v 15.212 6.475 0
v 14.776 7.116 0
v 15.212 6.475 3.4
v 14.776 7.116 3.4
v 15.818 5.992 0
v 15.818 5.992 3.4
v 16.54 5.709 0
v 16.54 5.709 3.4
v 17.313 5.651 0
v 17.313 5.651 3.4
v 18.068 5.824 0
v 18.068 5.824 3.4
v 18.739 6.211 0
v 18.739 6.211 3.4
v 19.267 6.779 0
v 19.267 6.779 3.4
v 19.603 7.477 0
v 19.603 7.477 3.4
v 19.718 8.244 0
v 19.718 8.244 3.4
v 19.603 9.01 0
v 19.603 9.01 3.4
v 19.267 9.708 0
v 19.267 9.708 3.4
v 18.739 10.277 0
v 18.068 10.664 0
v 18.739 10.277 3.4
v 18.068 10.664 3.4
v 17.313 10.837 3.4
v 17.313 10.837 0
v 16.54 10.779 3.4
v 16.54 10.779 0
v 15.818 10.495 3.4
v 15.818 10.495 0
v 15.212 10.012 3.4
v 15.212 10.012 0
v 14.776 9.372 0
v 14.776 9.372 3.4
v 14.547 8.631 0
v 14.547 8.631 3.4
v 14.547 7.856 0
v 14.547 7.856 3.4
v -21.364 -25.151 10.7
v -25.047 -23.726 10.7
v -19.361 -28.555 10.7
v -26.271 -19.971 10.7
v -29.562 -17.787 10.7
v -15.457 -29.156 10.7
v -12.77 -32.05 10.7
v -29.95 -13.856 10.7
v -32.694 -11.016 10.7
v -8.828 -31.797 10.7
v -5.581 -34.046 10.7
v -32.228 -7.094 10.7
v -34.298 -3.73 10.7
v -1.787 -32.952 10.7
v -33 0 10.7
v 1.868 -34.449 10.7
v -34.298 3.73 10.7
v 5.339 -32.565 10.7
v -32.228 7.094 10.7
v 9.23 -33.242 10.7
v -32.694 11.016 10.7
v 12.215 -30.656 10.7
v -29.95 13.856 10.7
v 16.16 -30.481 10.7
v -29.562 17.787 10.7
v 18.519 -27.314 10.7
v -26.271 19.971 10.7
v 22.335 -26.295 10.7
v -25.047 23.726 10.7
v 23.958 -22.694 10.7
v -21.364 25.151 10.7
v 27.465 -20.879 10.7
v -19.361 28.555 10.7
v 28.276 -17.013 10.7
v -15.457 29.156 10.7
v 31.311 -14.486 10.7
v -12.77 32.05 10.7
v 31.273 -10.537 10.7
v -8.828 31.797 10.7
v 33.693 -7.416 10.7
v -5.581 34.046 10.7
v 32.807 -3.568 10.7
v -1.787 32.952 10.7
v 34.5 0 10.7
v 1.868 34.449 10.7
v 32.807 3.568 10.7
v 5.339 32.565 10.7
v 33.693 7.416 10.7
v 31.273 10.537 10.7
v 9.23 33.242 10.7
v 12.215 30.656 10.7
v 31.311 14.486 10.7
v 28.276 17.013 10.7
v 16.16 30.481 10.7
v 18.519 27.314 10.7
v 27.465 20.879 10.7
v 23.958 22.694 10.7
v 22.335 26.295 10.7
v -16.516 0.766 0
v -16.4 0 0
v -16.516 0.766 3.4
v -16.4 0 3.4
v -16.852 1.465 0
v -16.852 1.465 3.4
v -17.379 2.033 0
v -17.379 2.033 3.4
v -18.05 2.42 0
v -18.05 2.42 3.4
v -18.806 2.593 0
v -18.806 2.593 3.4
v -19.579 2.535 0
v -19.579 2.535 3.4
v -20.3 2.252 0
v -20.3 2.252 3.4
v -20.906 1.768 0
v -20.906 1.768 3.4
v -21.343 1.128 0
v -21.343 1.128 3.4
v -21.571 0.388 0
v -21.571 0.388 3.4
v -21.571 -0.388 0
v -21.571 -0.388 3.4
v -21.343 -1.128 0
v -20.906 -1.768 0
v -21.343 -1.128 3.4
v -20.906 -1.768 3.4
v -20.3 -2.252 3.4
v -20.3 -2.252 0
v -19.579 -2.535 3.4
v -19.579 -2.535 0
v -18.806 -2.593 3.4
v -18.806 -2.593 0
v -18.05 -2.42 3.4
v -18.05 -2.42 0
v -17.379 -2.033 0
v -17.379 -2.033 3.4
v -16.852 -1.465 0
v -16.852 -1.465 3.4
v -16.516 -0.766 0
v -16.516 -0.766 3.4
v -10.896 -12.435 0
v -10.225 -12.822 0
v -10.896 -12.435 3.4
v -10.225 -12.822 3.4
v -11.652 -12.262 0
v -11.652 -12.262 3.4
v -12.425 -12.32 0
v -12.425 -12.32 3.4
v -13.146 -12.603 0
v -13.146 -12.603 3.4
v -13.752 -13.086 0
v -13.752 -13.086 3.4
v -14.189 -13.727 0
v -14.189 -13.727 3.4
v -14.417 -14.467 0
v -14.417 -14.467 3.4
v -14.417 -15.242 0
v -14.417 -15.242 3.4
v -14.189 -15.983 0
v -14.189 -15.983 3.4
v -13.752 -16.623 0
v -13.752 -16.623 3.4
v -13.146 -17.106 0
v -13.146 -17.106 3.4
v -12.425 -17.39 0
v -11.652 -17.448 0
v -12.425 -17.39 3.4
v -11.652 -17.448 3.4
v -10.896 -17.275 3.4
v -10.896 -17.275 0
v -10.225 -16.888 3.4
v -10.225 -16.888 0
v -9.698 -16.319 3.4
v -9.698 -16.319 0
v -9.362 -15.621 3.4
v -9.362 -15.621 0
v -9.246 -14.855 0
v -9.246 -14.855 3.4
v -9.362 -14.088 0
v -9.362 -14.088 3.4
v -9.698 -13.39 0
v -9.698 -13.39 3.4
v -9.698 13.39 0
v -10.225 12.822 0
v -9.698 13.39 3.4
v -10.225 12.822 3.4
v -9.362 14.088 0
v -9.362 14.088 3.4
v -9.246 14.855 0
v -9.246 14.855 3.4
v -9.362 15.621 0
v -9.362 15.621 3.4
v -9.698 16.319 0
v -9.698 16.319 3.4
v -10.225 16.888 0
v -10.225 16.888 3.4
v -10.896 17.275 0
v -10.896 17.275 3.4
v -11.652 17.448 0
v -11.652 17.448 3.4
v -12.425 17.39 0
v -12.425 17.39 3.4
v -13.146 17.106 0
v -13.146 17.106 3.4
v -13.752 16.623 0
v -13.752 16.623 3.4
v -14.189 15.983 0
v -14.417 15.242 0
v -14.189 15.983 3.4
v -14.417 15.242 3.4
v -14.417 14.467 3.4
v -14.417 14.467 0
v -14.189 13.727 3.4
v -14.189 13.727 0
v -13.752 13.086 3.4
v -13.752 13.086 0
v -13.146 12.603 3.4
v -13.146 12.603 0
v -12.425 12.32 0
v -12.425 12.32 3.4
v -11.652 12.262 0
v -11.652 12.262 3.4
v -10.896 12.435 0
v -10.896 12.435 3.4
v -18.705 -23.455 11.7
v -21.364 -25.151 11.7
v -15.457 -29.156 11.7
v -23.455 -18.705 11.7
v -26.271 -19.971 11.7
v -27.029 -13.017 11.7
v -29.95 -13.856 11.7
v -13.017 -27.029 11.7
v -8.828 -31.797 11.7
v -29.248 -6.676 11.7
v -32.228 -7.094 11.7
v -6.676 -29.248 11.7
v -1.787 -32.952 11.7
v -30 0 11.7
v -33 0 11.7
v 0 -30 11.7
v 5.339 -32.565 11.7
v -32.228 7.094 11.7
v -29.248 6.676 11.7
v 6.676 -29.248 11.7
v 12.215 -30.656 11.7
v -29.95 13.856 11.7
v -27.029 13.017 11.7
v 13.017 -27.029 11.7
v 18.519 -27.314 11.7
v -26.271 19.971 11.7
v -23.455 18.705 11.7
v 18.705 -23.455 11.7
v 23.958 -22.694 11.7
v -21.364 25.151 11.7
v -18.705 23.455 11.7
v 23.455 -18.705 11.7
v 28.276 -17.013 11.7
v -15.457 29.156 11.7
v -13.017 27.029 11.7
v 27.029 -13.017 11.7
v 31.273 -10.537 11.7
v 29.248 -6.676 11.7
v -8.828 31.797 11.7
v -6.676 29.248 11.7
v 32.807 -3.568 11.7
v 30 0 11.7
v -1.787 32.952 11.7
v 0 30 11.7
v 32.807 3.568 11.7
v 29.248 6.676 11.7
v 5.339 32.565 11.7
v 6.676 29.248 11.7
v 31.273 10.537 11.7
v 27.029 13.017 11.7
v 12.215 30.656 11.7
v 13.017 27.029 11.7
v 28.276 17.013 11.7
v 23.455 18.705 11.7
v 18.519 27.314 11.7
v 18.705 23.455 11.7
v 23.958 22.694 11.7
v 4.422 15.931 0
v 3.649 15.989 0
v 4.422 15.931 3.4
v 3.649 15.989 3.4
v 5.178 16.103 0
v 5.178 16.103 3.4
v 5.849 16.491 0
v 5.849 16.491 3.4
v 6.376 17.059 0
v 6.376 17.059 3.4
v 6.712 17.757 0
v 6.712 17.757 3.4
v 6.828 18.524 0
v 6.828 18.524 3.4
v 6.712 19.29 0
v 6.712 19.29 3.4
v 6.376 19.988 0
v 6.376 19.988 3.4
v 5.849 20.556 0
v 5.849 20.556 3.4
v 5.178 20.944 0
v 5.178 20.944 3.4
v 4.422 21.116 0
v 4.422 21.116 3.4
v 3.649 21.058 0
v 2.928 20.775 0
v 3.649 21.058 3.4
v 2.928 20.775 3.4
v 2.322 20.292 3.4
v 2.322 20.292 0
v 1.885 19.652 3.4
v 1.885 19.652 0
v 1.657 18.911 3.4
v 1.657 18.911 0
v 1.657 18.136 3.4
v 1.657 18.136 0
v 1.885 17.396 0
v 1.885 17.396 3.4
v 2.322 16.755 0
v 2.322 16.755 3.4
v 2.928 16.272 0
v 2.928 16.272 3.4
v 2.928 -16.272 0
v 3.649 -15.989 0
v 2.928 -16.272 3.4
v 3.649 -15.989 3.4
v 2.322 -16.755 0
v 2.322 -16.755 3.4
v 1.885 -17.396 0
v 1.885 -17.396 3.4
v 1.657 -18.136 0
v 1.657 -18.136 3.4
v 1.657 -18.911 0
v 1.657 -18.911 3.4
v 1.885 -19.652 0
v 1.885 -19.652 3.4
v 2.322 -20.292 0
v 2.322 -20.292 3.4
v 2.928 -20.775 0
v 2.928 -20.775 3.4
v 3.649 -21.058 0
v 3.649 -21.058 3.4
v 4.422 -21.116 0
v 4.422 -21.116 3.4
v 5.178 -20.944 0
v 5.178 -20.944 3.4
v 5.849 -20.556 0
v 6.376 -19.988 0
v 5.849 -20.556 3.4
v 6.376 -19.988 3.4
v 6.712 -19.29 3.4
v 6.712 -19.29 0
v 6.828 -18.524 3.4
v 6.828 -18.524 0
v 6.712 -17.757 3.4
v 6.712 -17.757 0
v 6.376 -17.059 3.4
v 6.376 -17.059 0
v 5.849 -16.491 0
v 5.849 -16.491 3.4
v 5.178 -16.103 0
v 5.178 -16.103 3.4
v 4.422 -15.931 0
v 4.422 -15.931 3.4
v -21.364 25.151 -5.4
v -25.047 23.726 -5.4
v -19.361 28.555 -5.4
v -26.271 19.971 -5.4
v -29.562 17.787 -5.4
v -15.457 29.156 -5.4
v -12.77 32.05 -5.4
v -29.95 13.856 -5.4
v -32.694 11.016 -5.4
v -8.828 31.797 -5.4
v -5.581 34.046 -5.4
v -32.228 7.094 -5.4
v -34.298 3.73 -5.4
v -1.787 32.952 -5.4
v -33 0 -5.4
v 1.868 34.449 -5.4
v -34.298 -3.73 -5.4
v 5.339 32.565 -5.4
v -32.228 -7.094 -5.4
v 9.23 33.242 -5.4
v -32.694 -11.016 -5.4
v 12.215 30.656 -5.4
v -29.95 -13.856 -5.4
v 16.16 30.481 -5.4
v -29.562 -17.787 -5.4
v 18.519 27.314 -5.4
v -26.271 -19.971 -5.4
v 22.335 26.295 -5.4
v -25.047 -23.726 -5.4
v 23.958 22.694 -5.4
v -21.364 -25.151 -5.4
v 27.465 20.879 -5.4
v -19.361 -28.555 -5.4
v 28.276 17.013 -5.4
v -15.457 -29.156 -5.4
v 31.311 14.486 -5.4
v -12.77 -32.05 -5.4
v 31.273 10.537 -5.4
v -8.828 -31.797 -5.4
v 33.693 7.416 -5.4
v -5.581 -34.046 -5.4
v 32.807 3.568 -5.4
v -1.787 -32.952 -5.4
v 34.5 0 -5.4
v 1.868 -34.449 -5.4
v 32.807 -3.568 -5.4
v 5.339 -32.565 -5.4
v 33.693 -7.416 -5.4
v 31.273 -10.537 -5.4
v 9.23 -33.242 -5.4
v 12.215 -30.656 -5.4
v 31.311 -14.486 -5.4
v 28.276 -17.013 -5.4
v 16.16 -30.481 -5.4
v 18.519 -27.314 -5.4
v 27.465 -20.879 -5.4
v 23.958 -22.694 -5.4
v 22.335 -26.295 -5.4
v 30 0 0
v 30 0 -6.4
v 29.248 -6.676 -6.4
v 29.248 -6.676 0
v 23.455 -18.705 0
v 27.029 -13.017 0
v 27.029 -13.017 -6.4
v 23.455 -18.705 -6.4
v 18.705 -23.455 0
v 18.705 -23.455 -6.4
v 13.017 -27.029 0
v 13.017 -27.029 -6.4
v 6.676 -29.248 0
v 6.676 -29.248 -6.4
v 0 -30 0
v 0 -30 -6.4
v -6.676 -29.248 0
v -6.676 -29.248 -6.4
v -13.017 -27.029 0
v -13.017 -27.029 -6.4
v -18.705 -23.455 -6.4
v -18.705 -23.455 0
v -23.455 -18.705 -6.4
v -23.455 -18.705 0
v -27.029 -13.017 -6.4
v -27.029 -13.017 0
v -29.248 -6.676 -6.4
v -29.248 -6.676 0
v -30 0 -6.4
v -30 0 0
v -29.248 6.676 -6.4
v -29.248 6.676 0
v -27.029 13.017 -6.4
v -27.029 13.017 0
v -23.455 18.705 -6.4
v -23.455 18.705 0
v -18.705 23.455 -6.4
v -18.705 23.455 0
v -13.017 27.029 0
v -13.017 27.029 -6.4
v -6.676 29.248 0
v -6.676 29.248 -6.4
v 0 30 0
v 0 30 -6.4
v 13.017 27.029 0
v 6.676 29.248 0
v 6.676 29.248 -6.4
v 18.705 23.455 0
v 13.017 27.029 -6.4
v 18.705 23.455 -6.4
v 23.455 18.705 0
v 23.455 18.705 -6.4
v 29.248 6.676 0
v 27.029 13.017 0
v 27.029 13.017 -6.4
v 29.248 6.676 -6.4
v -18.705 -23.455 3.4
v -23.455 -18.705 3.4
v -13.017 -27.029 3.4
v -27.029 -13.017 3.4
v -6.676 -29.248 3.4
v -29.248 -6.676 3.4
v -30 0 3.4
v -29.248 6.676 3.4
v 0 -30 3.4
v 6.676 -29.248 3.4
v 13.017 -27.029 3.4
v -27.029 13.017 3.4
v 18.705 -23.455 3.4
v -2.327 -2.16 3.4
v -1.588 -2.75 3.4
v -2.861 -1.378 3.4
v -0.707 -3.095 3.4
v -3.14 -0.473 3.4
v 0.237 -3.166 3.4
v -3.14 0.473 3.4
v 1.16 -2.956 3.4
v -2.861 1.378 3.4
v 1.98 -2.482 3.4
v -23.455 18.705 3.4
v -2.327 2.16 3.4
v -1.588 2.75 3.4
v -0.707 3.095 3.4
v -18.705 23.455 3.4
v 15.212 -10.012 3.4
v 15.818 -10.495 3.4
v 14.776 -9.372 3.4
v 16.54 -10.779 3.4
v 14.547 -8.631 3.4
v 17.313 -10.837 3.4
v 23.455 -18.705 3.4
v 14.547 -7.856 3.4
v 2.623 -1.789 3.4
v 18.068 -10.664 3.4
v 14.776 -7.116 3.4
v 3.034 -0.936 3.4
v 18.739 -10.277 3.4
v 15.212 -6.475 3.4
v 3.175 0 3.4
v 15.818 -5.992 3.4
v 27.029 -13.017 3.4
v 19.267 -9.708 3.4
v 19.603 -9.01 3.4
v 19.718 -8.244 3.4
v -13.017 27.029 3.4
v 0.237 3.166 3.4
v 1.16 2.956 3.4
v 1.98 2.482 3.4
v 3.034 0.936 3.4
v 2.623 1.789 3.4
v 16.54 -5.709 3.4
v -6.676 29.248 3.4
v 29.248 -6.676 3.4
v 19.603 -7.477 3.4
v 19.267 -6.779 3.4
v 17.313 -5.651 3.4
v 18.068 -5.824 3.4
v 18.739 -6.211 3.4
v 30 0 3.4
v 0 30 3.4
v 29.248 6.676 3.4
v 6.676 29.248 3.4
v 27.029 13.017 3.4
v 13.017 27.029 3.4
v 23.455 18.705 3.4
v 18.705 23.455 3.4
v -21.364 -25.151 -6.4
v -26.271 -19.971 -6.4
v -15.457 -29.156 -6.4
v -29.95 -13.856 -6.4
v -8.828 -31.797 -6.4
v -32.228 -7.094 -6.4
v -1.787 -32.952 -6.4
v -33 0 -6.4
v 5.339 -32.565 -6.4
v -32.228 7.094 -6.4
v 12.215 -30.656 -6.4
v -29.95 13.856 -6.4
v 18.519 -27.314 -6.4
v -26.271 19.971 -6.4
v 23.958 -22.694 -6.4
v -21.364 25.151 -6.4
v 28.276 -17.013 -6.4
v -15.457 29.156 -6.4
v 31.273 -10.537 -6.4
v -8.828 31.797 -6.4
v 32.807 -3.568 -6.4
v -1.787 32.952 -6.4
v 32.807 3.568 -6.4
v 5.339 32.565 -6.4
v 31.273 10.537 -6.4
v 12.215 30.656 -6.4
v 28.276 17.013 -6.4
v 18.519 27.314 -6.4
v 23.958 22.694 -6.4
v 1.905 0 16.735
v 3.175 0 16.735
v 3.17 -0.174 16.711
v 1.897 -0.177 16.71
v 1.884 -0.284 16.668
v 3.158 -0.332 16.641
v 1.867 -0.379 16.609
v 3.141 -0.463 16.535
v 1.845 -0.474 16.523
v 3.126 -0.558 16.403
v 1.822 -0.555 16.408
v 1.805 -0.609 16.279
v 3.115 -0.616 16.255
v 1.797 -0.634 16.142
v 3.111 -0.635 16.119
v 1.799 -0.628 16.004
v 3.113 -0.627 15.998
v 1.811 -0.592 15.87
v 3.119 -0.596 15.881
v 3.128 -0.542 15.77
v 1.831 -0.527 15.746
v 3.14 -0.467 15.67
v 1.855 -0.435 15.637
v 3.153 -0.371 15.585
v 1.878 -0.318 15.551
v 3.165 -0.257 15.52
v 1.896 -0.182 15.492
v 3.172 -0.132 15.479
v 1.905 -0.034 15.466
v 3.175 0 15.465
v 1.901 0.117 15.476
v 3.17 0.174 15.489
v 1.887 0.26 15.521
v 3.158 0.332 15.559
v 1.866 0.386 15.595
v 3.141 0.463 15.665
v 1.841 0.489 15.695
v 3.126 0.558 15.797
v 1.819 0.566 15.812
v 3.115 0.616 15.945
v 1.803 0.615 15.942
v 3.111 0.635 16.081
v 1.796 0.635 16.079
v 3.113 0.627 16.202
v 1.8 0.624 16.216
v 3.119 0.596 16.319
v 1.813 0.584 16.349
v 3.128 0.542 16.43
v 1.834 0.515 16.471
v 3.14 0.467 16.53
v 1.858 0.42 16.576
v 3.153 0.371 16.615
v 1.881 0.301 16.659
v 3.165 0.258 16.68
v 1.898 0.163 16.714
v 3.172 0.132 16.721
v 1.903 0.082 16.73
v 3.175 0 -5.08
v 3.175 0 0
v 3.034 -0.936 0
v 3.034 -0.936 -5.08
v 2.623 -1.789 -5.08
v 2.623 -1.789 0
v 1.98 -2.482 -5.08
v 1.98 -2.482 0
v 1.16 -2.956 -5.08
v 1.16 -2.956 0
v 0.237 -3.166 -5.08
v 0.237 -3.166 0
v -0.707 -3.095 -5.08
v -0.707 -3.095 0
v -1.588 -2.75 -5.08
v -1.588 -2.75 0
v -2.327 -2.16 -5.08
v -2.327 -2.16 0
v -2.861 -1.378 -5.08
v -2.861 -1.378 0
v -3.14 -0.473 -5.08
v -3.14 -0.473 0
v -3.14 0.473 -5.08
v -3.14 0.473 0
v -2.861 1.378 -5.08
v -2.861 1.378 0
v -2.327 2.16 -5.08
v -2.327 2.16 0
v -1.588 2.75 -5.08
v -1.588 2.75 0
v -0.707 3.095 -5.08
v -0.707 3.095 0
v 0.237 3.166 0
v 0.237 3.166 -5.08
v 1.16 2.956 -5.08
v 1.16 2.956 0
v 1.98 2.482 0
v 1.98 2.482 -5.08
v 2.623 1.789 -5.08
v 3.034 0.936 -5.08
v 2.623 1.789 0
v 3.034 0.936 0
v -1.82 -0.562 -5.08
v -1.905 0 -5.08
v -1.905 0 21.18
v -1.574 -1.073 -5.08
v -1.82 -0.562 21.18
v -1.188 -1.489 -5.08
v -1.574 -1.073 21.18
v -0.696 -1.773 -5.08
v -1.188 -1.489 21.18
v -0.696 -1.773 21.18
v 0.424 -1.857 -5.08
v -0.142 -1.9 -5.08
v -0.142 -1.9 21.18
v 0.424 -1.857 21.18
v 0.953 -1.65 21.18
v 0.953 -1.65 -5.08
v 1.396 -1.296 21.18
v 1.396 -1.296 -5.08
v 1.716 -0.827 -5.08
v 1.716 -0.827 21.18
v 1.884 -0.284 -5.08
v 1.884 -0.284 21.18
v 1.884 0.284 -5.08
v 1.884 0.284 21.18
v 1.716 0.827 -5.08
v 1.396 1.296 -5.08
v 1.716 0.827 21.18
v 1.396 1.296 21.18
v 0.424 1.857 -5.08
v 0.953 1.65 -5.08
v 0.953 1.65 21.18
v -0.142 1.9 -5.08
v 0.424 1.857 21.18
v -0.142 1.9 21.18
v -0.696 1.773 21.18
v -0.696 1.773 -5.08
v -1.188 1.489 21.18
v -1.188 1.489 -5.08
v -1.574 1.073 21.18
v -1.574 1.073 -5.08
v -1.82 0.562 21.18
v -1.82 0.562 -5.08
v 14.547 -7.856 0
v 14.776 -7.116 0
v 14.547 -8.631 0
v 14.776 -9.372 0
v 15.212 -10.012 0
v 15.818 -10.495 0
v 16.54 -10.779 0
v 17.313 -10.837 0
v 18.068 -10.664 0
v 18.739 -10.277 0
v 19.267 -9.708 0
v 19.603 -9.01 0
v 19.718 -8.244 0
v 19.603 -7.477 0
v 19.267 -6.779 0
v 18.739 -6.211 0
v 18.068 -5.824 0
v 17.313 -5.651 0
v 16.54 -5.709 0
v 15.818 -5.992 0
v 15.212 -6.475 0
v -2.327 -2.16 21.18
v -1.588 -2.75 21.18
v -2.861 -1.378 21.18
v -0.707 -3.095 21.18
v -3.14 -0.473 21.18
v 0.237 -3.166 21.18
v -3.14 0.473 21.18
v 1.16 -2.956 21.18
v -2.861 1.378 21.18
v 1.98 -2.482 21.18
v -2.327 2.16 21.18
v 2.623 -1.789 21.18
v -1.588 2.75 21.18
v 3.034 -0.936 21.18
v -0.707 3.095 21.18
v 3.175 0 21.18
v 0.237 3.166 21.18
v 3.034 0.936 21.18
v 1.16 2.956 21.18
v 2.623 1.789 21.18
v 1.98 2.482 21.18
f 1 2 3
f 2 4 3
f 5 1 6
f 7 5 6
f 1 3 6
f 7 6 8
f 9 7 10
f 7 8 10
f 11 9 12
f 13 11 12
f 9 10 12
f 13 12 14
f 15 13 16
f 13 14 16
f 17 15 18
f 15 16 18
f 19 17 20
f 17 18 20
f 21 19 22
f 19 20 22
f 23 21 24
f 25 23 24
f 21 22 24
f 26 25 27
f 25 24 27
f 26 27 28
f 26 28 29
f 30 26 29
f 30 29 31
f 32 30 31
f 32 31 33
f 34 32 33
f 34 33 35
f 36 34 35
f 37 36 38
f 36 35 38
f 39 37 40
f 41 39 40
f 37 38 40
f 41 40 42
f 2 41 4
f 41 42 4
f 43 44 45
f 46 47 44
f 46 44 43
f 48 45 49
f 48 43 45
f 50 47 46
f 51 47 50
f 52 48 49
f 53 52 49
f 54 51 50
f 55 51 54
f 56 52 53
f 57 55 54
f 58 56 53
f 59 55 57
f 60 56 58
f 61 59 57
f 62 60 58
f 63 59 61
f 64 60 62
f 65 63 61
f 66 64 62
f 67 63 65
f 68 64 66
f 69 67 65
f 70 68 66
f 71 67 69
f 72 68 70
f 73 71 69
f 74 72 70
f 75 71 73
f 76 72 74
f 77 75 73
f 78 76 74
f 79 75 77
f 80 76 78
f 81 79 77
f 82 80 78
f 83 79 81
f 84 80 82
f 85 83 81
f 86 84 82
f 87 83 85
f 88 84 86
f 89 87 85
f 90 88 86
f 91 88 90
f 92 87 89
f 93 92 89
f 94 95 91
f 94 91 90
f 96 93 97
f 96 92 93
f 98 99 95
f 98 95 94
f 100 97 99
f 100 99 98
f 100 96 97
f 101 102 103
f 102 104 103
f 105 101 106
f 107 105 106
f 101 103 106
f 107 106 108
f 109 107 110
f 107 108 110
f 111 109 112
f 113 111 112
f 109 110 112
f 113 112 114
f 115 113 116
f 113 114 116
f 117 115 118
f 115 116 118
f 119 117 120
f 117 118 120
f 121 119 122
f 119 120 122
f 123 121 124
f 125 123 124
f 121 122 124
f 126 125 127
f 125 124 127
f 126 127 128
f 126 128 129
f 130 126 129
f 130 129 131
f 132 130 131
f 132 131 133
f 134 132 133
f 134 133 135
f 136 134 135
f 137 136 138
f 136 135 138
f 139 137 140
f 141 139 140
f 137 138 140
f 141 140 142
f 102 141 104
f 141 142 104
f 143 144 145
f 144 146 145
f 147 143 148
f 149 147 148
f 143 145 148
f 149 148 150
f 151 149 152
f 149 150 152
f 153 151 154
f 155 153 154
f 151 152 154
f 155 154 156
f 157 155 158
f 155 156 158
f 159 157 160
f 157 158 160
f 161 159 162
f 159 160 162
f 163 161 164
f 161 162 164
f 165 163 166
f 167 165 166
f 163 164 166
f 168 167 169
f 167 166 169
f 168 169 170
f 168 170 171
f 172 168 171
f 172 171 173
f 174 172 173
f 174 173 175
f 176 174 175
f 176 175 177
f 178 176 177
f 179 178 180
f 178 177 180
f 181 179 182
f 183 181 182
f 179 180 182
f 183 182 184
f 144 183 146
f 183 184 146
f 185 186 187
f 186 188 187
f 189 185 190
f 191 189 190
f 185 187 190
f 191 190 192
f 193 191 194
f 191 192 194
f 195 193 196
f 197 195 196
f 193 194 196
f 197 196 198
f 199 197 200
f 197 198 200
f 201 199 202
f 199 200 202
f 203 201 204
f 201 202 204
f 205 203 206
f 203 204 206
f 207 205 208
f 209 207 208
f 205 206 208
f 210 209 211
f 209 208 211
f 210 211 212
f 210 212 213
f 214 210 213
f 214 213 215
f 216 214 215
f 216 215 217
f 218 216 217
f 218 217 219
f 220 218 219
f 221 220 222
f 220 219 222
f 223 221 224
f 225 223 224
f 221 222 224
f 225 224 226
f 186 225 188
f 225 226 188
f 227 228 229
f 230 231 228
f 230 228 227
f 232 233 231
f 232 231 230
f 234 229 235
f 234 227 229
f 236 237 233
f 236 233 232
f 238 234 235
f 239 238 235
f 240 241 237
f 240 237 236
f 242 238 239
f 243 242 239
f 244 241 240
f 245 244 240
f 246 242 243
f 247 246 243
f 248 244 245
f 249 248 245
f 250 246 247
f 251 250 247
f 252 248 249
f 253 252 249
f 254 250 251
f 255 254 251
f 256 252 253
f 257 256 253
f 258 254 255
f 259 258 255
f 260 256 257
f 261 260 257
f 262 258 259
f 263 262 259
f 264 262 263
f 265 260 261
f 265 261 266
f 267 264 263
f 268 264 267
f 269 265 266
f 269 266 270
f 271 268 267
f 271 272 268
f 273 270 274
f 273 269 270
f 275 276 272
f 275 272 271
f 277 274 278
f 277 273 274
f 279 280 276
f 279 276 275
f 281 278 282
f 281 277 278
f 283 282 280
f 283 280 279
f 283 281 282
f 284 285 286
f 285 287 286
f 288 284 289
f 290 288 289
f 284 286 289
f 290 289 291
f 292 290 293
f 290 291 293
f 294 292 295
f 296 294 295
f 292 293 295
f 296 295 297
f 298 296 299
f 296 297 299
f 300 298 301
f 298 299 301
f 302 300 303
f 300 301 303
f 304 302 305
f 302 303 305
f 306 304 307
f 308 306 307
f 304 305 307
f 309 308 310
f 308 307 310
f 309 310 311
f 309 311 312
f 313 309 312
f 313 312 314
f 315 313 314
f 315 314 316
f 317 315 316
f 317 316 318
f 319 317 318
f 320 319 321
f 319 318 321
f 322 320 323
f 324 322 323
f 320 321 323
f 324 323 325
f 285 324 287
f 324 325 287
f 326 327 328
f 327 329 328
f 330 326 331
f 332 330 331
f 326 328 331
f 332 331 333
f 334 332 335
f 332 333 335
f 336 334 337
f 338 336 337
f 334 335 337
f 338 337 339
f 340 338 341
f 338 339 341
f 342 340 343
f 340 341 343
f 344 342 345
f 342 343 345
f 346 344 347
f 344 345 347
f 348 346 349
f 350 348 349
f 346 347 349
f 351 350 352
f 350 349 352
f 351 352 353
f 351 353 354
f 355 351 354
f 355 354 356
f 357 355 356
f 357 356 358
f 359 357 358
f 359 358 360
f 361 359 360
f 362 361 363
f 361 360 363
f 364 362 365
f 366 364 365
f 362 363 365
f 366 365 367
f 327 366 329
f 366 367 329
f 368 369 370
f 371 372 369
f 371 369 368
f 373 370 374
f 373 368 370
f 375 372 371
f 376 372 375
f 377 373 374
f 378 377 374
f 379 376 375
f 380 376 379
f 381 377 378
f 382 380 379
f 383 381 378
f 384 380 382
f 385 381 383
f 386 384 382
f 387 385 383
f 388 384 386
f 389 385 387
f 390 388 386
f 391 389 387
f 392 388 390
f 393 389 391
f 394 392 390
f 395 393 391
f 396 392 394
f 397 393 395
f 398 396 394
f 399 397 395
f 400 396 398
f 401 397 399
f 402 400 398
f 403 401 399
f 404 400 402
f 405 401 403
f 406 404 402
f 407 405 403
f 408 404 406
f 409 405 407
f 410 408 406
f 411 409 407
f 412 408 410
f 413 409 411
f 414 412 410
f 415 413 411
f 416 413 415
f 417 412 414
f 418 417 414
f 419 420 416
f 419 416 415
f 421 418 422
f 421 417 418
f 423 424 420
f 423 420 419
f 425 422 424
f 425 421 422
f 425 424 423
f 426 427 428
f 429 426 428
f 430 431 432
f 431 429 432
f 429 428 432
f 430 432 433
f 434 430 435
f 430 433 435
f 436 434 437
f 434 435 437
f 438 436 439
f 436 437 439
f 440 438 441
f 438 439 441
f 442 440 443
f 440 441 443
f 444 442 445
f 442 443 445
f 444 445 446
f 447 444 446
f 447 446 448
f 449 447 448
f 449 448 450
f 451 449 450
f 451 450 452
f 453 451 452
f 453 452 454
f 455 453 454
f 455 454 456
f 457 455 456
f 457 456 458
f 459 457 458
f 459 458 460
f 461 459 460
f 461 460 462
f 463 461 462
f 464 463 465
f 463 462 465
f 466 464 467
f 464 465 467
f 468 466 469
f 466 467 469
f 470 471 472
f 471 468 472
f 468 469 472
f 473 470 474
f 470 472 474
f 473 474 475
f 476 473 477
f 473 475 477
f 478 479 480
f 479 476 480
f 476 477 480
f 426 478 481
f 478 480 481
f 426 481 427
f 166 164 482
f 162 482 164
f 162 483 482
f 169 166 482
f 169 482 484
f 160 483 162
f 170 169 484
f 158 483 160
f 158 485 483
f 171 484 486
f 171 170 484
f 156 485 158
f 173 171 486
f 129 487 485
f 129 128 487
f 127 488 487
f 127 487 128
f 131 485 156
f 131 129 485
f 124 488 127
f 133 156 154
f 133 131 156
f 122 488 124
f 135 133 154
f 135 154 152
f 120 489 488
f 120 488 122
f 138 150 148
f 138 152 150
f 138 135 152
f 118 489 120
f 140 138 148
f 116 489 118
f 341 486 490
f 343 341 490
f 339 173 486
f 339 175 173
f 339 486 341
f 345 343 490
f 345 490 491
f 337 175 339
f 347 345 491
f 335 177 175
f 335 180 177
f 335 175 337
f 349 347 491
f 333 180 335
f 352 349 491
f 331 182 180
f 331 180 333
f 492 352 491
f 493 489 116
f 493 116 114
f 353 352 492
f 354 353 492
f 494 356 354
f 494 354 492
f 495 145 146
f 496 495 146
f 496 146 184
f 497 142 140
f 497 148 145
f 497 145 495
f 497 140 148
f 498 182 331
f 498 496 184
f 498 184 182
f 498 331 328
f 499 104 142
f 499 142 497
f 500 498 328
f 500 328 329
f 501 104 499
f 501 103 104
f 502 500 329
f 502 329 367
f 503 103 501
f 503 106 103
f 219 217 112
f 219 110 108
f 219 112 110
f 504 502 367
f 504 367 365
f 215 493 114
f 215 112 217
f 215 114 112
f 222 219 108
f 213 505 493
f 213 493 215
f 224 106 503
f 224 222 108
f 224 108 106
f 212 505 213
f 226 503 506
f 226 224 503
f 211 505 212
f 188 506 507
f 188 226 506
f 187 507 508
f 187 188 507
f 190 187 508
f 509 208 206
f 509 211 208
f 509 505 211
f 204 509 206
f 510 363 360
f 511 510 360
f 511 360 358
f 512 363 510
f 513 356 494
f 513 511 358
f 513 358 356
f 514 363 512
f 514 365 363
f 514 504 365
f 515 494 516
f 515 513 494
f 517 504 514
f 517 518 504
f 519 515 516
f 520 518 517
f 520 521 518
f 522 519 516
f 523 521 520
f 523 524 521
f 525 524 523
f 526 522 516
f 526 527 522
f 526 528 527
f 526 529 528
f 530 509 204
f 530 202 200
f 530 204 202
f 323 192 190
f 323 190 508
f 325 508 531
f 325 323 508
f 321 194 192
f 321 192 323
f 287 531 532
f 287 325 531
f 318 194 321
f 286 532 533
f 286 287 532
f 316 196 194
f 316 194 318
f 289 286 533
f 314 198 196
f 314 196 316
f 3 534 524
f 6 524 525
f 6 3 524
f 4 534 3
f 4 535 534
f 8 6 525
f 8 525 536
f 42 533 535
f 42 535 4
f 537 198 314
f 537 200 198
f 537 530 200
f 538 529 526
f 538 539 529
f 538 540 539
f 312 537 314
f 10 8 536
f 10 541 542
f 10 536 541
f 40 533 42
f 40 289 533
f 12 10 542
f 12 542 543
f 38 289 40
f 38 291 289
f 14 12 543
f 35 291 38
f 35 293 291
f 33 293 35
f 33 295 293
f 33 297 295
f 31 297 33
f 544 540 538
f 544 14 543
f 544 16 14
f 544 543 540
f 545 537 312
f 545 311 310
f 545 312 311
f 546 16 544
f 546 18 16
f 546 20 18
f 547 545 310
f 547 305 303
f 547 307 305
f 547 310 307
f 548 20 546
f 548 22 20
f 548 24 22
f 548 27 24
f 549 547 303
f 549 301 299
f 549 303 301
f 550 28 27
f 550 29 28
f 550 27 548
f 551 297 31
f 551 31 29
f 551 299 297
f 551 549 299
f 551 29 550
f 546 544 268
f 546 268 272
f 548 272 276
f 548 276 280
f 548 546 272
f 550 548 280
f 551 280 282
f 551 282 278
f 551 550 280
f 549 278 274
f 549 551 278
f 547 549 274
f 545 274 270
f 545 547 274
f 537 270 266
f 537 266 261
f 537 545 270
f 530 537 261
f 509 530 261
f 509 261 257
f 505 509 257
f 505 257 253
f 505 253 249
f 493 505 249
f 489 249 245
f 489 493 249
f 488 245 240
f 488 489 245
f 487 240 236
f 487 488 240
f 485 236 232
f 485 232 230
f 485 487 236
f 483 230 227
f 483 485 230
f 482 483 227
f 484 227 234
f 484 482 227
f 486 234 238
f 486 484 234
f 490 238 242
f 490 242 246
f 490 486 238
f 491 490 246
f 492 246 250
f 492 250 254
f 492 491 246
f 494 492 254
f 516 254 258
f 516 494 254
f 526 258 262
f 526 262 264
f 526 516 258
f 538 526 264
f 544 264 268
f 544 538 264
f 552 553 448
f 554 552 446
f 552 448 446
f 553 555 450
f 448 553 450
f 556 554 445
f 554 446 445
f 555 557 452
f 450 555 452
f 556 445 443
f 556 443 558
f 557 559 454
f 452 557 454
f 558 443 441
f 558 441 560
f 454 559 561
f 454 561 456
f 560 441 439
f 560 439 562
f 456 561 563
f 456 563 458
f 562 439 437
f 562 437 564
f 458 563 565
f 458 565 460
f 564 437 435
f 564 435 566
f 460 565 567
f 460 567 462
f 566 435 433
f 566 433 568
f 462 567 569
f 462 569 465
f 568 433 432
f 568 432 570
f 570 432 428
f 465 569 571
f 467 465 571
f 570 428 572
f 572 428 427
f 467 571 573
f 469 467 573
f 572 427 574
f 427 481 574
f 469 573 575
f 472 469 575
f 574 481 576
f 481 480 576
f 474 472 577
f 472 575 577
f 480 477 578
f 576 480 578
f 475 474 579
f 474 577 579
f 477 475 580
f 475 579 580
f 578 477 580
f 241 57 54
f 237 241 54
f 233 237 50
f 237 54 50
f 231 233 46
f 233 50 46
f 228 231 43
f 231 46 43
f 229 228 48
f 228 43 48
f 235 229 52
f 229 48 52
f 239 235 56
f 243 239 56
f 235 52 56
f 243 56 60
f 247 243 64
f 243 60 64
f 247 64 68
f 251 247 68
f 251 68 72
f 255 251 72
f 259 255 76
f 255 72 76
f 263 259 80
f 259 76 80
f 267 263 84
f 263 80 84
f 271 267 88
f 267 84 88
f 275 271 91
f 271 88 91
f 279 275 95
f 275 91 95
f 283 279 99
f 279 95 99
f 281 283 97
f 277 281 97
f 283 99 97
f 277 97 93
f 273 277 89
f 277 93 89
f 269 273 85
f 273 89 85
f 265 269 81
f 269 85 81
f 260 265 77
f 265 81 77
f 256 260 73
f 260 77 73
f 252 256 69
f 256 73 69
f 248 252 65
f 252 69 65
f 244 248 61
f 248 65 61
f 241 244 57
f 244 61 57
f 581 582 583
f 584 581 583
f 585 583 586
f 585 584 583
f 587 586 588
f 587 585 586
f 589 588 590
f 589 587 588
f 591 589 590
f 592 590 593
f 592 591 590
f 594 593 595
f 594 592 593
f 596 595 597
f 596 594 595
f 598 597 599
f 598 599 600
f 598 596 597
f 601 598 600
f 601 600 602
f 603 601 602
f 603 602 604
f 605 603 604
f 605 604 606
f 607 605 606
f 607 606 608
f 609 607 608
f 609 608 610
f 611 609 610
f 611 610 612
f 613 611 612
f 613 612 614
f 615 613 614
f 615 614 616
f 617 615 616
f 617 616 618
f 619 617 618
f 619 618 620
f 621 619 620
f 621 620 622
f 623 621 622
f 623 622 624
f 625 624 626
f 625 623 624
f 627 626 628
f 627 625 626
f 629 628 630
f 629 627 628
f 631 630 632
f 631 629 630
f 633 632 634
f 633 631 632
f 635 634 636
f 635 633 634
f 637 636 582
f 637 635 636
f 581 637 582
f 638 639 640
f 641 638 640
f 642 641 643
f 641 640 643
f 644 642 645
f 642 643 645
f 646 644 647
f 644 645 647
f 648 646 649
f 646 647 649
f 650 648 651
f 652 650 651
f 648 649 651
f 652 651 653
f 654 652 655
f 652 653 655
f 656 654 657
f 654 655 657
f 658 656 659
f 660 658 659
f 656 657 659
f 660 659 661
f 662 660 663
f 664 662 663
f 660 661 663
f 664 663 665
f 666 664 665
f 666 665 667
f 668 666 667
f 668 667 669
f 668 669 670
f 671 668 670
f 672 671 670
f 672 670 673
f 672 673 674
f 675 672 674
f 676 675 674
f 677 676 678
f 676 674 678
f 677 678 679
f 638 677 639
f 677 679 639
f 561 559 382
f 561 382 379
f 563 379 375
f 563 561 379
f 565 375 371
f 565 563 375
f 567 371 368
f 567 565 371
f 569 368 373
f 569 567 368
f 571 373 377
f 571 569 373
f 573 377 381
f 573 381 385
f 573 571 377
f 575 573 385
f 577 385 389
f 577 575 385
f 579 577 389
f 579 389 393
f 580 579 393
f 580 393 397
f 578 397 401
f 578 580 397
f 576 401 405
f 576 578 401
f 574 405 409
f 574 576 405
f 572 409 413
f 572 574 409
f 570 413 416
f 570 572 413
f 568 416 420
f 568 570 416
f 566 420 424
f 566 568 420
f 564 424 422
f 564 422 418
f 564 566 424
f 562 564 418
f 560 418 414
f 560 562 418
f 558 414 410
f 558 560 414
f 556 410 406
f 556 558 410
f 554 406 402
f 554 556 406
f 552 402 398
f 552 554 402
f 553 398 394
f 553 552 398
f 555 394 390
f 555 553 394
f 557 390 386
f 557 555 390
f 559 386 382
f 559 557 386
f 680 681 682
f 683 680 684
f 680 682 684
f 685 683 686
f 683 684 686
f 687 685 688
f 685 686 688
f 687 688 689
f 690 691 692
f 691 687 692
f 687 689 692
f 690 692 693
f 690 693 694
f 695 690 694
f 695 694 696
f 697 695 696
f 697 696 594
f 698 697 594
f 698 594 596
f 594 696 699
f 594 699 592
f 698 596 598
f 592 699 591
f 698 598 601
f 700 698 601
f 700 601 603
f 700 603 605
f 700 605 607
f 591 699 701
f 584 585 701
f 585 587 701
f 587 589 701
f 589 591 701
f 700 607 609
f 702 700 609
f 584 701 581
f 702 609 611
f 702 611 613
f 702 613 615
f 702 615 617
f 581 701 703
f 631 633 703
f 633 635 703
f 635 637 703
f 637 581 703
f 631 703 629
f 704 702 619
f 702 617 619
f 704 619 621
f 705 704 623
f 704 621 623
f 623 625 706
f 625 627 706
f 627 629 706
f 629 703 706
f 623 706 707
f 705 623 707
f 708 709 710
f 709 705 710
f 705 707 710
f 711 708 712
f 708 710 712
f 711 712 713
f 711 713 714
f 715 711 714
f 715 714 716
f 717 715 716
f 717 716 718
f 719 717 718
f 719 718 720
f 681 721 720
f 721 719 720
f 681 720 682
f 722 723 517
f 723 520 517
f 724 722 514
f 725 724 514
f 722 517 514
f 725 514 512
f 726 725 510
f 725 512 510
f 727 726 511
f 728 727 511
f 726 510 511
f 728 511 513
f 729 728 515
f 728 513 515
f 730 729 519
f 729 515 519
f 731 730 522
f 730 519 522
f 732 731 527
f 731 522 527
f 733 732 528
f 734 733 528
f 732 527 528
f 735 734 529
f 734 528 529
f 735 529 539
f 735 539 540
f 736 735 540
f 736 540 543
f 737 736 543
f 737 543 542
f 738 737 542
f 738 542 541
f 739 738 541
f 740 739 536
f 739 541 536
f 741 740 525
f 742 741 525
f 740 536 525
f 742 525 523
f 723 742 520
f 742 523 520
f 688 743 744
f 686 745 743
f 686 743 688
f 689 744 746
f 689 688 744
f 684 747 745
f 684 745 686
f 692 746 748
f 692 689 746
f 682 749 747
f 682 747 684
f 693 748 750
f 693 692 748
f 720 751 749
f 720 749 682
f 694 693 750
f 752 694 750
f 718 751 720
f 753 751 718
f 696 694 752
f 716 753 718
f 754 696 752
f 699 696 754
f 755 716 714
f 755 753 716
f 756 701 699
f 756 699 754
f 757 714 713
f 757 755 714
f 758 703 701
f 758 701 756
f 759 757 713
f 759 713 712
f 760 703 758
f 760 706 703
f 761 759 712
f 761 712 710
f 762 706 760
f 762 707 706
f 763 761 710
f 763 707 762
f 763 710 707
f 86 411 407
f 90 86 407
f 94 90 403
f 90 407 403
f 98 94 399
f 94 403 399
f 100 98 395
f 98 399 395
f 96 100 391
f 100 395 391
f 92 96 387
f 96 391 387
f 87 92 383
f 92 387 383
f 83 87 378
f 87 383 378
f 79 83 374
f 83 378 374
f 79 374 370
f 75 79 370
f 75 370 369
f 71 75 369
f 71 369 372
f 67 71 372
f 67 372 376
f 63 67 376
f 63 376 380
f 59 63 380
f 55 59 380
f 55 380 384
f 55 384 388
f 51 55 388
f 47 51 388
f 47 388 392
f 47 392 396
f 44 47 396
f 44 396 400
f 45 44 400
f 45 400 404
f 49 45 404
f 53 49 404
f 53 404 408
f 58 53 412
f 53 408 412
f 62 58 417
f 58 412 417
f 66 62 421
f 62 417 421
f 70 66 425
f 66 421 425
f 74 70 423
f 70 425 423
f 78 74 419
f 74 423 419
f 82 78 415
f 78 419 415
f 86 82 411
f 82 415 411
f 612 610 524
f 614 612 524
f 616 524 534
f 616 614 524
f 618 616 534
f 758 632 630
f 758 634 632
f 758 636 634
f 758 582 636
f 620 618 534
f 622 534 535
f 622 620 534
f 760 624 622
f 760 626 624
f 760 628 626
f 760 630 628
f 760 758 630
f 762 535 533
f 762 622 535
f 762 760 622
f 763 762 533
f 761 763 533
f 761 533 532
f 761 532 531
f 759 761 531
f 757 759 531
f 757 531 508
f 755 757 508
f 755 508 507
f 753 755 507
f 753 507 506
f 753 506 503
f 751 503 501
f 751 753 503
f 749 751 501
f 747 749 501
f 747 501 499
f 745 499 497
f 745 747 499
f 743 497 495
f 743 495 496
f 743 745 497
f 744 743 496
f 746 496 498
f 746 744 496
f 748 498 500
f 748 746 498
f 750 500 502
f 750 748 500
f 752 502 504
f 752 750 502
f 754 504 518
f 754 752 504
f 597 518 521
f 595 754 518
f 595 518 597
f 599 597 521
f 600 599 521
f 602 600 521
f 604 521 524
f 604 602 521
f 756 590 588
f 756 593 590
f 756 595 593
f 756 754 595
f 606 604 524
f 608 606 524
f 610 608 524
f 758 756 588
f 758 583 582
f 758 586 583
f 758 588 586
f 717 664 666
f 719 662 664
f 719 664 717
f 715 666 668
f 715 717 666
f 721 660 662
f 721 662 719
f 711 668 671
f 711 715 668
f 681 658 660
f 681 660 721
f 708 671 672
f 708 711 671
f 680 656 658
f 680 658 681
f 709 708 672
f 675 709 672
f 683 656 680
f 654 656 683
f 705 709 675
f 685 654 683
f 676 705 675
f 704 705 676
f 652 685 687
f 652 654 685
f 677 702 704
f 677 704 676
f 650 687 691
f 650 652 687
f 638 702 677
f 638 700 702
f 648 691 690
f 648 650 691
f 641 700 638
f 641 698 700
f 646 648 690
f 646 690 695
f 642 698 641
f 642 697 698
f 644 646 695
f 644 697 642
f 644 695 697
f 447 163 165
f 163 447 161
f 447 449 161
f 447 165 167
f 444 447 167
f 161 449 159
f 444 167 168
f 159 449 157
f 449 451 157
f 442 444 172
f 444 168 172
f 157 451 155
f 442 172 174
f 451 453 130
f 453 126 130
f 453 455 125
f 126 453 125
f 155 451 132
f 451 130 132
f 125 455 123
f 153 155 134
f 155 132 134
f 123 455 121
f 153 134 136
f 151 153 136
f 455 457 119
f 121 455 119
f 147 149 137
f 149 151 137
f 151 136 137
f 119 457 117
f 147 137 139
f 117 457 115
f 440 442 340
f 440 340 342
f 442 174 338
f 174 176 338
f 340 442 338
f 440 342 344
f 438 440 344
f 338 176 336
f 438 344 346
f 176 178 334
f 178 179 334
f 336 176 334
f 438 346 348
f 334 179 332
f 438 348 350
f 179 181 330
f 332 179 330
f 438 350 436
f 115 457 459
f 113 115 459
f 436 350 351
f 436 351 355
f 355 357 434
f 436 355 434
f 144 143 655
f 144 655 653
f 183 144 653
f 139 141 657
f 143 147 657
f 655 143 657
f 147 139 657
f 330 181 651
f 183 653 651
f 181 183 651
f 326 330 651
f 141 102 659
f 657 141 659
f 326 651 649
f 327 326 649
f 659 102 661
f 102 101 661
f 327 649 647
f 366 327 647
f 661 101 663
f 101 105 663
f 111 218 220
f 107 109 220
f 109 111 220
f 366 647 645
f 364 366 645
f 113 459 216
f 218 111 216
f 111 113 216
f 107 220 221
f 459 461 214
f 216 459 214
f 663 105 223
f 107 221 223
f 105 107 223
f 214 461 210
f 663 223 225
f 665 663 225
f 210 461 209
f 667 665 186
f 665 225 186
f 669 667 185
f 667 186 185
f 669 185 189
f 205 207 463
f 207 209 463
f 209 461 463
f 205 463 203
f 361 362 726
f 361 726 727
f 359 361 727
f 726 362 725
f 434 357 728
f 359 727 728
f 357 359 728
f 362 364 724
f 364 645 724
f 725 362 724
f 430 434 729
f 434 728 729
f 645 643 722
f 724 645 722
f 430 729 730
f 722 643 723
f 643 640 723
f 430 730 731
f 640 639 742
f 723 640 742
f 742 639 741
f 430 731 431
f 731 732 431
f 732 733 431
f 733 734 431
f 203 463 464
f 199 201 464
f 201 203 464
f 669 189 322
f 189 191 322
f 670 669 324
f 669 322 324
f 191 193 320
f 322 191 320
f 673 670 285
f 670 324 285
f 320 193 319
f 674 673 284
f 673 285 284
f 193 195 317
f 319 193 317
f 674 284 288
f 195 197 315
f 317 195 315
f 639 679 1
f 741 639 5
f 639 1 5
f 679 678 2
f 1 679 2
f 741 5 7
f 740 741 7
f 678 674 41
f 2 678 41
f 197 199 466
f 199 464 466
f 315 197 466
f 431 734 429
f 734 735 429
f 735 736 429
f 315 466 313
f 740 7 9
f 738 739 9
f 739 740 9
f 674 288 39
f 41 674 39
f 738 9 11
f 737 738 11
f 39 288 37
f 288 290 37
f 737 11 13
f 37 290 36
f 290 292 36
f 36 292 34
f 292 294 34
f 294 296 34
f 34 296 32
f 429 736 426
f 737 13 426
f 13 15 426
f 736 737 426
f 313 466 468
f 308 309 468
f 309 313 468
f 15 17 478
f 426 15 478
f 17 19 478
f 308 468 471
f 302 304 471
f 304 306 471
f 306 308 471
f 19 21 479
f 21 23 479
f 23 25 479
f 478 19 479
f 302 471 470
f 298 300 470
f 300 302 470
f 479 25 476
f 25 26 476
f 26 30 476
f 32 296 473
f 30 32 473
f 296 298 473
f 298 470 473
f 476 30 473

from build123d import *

# Parameters (mm, degrees)
SKETCH1_R               = 30
EXTRUDE1_DEPTH          = 3.4
SKETCH2_R               = 33.4
SKETCH2_R_2             = 30
EXTRUDE2_DEPTH          = 8.3
EXTRUDE3_START          = 9.8
SKETCH3_R               = 33.4
SKETCH3_R_2             = 30
EXTRUDE3_DEPTH          = 9.8
EXTRUDE4_START          = -18.1
SKETCH4_R               = 34.5
SKETCH4_R_2             = 33.4
EXTRUDE4_DEPTH          = 18.1
SKETCH6_R               = 34.5
SKETCH6_R_2             = 33
EXTRUDE5_DEPTH          = 1
EXTRUDE6_START          = -1
SKETCH8_R               = 34.5
SKETCH8_R_2             = 33
EXTRUDE6_DEPTH          = 1
SKETCH9_R               = 3.175
EXTRUDE7_DEPTH          = 5.08
EXTRUDE8_START          = 17.78
SKETCH10_R              = 3.175
SKETCH10_R_2            = 1.905
EXTRUDE8_DEPTH          = 17.78
SKETCH13_R              = 2.6
EXTRUDE11_DEPTH         = 10
CIRPATTERN1_COUNT       = 7
CUT_EXTRUDE1_REACH      = 55.189
CUT_EXTRUDE1_END_RADIUS = 3.175
SKETCH14_R              = 0.635
CUT_EXTRUDE2_REACH      = 57.408
SKETCH15_R              = 1.905


with BuildPart() as part:
    # Sketch1 → Extrude1 (new body)
    with BuildSketch(Plane.XY):
        Circle(SKETCH1_R)
    extrude(amount=EXTRUDE1_DEPTH)



with BuildPart() as body_2:
    # Sketch2 → Extrude2 (new body)
    with BuildSketch(Plane.XY.offset(3.4)):
        with Locations(Location((0, 0, 0), (0, 0, 180))):
            Circle(SKETCH2_R)
        Circle(SKETCH2_R_2, mode=Mode.SUBTRACT)
    extrude(amount=EXTRUDE2_DEPTH)


with BuildPart() as part_1:
    add(part.part)

    add(body_2.part)  # Extrude3 merges body 2
    # Sketch3 → Extrude3 (add)
    with BuildSketch(Plane(origin=(0, 0, 3.4), x_dir=(-1, 0, 0), z_dir=(0, 0, -1)).offset(EXTRUDE3_START)):
        with Locations(Location((0, 0, 0), (0, 0, 180))):
            Circle(SKETCH3_R)
        with Locations(Location((0, 0, 0), (0, 0, 180))):
            Circle(SKETCH3_R_2, mode=Mode.SUBTRACT)
    extrude(amount=-EXTRUDE3_DEPTH)

    # Sketch4 → Extrude4 (add)
    with BuildSketch(Plane.XY.offset(11.7).offset(EXTRUDE4_START)):
        Circle(SKETCH4_R)
        Circle(SKETCH4_R_2, mode=Mode.SUBTRACT)
    extrude(amount=EXTRUDE4_DEPTH)

    # Sketch6 → Extrude5 (cut)
    with BuildSketch(Plane(origin=(0, 0, -6.4), x_dir=(-1, 0, 0), z_dir=(0, 0, -1))):
        with Locations(Location((0, 0, 0), (0, 0, 180))):
            Circle(SKETCH6_R)
        Circle(SKETCH6_R_2, mode=Mode.SUBTRACT)
    extrude(amount=-EXTRUDE5_DEPTH, mode=Mode.SUBTRACT)

    # Sketch8 → Extrude6 (cut)
    with BuildSketch(Plane.XY.offset(11.7).offset(EXTRUDE6_START)):
        Circle(SKETCH8_R)
        with Locations(Location((0, 0, 0), (0, 0, 180))):
            Circle(SKETCH8_R_2, mode=Mode.SUBTRACT)
    extrude(amount=EXTRUDE6_DEPTH, mode=Mode.SUBTRACT)

    # Sketch9 → Extrude7 (add)
    with BuildSketch(Plane(origin=(0, 0, 0), x_dir=(-1, 0, 0), z_dir=(0, 0, -1))):
        with Locations(Location((0, 0, 0), (0, 0, 180))):
            Circle(SKETCH9_R)
    extrude(amount=EXTRUDE7_DEPTH)

    # Sketch10 → Extrude8 (add)
    with BuildSketch(Plane.XY.offset(3.4).offset(EXTRUDE8_START)):
        Circle(SKETCH10_R)
        with Locations(Location((0, 0, 0), (0, 0, 180))):
            Circle(SKETCH10_R_2, mode=Mode.SUBTRACT)
    extrude(amount=-EXTRUDE8_DEPTH)

    # Sketch13 → Extrude11 (cut, symmetric)
    with BuildSketch(Plane.XY.offset(3.4)):
        with Locations((-19, 0)):
            Circle(SKETCH13_R)
    extrude11 = extrude(amount=EXTRUDE11_DEPTH, both=True, mode=Mode.SUBTRACT)

    # CirPattern1: Extrude11 ×7 about axis
    cirpattern1_axis = Axis((0, 0, 0), (0, 0, 1))
    for i in range(1, CIRPATTERN1_COUNT):
        add(extrude11.rotate(cirpattern1_axis, i * 360 / CIRPATTERN1_COUNT), mode=Mode.SUBTRACT)

    # Cut-Extrude1: up to this cylinder (the profile starts inside it)
    cut_extrude1_end = Plane(origin=(0, 0, 16.1), z_dir=(0, 0, -1)) * Cylinder(CUT_EXTRUDE1_END_RADIUS, 117.728, mode=Mode.PRIVATE)
    # Sketch14 → Cut-Extrude1 (cut, up to the surface)
    with BuildSketch(Plane(origin=(0, 0, 0), x_dir=(0, 0, -1), z_dir=(1, 0, 0)), mode=Mode.PRIVATE) as cut_extrude1_sk1:
        with Locations(Location((-16.1, 0, 0), (0, 0, 180))):
            Circle(SKETCH14_R)
    cut_extrude1_tool1 = extrude(cut_extrude1_sk1.sketch, amount=CUT_EXTRUDE1_REACH, mode=Mode.PRIVATE) & cut_extrude1_end
    add(cut_extrude1_tool1.solids().sort_by_distance((0, 0, 16.1))[0], mode=Mode.SUBTRACT)

    # Sketch15 → Cut-Extrude2 (cut, up to next)
    with BuildSketch(Plane(origin=(0, 0, -5.08), x_dir=(-1, 0, 0), z_dir=(0, 0, -1)), mode=Mode.PRIVATE) as cut_extrude2_sk1:
        Circle(SKETCH15_R)
    cut_extrude2_tool1 = extrude(cut_extrude2_sk1.sketch, amount=-CUT_EXTRUDE2_REACH, mode=Mode.PRIVATE) & part_1.part
    add(cut_extrude2_tool1.solids().sort_by_distance((0, 0, -5.08))[0], mode=Mode.SUBTRACT)


solid = part_1.part
